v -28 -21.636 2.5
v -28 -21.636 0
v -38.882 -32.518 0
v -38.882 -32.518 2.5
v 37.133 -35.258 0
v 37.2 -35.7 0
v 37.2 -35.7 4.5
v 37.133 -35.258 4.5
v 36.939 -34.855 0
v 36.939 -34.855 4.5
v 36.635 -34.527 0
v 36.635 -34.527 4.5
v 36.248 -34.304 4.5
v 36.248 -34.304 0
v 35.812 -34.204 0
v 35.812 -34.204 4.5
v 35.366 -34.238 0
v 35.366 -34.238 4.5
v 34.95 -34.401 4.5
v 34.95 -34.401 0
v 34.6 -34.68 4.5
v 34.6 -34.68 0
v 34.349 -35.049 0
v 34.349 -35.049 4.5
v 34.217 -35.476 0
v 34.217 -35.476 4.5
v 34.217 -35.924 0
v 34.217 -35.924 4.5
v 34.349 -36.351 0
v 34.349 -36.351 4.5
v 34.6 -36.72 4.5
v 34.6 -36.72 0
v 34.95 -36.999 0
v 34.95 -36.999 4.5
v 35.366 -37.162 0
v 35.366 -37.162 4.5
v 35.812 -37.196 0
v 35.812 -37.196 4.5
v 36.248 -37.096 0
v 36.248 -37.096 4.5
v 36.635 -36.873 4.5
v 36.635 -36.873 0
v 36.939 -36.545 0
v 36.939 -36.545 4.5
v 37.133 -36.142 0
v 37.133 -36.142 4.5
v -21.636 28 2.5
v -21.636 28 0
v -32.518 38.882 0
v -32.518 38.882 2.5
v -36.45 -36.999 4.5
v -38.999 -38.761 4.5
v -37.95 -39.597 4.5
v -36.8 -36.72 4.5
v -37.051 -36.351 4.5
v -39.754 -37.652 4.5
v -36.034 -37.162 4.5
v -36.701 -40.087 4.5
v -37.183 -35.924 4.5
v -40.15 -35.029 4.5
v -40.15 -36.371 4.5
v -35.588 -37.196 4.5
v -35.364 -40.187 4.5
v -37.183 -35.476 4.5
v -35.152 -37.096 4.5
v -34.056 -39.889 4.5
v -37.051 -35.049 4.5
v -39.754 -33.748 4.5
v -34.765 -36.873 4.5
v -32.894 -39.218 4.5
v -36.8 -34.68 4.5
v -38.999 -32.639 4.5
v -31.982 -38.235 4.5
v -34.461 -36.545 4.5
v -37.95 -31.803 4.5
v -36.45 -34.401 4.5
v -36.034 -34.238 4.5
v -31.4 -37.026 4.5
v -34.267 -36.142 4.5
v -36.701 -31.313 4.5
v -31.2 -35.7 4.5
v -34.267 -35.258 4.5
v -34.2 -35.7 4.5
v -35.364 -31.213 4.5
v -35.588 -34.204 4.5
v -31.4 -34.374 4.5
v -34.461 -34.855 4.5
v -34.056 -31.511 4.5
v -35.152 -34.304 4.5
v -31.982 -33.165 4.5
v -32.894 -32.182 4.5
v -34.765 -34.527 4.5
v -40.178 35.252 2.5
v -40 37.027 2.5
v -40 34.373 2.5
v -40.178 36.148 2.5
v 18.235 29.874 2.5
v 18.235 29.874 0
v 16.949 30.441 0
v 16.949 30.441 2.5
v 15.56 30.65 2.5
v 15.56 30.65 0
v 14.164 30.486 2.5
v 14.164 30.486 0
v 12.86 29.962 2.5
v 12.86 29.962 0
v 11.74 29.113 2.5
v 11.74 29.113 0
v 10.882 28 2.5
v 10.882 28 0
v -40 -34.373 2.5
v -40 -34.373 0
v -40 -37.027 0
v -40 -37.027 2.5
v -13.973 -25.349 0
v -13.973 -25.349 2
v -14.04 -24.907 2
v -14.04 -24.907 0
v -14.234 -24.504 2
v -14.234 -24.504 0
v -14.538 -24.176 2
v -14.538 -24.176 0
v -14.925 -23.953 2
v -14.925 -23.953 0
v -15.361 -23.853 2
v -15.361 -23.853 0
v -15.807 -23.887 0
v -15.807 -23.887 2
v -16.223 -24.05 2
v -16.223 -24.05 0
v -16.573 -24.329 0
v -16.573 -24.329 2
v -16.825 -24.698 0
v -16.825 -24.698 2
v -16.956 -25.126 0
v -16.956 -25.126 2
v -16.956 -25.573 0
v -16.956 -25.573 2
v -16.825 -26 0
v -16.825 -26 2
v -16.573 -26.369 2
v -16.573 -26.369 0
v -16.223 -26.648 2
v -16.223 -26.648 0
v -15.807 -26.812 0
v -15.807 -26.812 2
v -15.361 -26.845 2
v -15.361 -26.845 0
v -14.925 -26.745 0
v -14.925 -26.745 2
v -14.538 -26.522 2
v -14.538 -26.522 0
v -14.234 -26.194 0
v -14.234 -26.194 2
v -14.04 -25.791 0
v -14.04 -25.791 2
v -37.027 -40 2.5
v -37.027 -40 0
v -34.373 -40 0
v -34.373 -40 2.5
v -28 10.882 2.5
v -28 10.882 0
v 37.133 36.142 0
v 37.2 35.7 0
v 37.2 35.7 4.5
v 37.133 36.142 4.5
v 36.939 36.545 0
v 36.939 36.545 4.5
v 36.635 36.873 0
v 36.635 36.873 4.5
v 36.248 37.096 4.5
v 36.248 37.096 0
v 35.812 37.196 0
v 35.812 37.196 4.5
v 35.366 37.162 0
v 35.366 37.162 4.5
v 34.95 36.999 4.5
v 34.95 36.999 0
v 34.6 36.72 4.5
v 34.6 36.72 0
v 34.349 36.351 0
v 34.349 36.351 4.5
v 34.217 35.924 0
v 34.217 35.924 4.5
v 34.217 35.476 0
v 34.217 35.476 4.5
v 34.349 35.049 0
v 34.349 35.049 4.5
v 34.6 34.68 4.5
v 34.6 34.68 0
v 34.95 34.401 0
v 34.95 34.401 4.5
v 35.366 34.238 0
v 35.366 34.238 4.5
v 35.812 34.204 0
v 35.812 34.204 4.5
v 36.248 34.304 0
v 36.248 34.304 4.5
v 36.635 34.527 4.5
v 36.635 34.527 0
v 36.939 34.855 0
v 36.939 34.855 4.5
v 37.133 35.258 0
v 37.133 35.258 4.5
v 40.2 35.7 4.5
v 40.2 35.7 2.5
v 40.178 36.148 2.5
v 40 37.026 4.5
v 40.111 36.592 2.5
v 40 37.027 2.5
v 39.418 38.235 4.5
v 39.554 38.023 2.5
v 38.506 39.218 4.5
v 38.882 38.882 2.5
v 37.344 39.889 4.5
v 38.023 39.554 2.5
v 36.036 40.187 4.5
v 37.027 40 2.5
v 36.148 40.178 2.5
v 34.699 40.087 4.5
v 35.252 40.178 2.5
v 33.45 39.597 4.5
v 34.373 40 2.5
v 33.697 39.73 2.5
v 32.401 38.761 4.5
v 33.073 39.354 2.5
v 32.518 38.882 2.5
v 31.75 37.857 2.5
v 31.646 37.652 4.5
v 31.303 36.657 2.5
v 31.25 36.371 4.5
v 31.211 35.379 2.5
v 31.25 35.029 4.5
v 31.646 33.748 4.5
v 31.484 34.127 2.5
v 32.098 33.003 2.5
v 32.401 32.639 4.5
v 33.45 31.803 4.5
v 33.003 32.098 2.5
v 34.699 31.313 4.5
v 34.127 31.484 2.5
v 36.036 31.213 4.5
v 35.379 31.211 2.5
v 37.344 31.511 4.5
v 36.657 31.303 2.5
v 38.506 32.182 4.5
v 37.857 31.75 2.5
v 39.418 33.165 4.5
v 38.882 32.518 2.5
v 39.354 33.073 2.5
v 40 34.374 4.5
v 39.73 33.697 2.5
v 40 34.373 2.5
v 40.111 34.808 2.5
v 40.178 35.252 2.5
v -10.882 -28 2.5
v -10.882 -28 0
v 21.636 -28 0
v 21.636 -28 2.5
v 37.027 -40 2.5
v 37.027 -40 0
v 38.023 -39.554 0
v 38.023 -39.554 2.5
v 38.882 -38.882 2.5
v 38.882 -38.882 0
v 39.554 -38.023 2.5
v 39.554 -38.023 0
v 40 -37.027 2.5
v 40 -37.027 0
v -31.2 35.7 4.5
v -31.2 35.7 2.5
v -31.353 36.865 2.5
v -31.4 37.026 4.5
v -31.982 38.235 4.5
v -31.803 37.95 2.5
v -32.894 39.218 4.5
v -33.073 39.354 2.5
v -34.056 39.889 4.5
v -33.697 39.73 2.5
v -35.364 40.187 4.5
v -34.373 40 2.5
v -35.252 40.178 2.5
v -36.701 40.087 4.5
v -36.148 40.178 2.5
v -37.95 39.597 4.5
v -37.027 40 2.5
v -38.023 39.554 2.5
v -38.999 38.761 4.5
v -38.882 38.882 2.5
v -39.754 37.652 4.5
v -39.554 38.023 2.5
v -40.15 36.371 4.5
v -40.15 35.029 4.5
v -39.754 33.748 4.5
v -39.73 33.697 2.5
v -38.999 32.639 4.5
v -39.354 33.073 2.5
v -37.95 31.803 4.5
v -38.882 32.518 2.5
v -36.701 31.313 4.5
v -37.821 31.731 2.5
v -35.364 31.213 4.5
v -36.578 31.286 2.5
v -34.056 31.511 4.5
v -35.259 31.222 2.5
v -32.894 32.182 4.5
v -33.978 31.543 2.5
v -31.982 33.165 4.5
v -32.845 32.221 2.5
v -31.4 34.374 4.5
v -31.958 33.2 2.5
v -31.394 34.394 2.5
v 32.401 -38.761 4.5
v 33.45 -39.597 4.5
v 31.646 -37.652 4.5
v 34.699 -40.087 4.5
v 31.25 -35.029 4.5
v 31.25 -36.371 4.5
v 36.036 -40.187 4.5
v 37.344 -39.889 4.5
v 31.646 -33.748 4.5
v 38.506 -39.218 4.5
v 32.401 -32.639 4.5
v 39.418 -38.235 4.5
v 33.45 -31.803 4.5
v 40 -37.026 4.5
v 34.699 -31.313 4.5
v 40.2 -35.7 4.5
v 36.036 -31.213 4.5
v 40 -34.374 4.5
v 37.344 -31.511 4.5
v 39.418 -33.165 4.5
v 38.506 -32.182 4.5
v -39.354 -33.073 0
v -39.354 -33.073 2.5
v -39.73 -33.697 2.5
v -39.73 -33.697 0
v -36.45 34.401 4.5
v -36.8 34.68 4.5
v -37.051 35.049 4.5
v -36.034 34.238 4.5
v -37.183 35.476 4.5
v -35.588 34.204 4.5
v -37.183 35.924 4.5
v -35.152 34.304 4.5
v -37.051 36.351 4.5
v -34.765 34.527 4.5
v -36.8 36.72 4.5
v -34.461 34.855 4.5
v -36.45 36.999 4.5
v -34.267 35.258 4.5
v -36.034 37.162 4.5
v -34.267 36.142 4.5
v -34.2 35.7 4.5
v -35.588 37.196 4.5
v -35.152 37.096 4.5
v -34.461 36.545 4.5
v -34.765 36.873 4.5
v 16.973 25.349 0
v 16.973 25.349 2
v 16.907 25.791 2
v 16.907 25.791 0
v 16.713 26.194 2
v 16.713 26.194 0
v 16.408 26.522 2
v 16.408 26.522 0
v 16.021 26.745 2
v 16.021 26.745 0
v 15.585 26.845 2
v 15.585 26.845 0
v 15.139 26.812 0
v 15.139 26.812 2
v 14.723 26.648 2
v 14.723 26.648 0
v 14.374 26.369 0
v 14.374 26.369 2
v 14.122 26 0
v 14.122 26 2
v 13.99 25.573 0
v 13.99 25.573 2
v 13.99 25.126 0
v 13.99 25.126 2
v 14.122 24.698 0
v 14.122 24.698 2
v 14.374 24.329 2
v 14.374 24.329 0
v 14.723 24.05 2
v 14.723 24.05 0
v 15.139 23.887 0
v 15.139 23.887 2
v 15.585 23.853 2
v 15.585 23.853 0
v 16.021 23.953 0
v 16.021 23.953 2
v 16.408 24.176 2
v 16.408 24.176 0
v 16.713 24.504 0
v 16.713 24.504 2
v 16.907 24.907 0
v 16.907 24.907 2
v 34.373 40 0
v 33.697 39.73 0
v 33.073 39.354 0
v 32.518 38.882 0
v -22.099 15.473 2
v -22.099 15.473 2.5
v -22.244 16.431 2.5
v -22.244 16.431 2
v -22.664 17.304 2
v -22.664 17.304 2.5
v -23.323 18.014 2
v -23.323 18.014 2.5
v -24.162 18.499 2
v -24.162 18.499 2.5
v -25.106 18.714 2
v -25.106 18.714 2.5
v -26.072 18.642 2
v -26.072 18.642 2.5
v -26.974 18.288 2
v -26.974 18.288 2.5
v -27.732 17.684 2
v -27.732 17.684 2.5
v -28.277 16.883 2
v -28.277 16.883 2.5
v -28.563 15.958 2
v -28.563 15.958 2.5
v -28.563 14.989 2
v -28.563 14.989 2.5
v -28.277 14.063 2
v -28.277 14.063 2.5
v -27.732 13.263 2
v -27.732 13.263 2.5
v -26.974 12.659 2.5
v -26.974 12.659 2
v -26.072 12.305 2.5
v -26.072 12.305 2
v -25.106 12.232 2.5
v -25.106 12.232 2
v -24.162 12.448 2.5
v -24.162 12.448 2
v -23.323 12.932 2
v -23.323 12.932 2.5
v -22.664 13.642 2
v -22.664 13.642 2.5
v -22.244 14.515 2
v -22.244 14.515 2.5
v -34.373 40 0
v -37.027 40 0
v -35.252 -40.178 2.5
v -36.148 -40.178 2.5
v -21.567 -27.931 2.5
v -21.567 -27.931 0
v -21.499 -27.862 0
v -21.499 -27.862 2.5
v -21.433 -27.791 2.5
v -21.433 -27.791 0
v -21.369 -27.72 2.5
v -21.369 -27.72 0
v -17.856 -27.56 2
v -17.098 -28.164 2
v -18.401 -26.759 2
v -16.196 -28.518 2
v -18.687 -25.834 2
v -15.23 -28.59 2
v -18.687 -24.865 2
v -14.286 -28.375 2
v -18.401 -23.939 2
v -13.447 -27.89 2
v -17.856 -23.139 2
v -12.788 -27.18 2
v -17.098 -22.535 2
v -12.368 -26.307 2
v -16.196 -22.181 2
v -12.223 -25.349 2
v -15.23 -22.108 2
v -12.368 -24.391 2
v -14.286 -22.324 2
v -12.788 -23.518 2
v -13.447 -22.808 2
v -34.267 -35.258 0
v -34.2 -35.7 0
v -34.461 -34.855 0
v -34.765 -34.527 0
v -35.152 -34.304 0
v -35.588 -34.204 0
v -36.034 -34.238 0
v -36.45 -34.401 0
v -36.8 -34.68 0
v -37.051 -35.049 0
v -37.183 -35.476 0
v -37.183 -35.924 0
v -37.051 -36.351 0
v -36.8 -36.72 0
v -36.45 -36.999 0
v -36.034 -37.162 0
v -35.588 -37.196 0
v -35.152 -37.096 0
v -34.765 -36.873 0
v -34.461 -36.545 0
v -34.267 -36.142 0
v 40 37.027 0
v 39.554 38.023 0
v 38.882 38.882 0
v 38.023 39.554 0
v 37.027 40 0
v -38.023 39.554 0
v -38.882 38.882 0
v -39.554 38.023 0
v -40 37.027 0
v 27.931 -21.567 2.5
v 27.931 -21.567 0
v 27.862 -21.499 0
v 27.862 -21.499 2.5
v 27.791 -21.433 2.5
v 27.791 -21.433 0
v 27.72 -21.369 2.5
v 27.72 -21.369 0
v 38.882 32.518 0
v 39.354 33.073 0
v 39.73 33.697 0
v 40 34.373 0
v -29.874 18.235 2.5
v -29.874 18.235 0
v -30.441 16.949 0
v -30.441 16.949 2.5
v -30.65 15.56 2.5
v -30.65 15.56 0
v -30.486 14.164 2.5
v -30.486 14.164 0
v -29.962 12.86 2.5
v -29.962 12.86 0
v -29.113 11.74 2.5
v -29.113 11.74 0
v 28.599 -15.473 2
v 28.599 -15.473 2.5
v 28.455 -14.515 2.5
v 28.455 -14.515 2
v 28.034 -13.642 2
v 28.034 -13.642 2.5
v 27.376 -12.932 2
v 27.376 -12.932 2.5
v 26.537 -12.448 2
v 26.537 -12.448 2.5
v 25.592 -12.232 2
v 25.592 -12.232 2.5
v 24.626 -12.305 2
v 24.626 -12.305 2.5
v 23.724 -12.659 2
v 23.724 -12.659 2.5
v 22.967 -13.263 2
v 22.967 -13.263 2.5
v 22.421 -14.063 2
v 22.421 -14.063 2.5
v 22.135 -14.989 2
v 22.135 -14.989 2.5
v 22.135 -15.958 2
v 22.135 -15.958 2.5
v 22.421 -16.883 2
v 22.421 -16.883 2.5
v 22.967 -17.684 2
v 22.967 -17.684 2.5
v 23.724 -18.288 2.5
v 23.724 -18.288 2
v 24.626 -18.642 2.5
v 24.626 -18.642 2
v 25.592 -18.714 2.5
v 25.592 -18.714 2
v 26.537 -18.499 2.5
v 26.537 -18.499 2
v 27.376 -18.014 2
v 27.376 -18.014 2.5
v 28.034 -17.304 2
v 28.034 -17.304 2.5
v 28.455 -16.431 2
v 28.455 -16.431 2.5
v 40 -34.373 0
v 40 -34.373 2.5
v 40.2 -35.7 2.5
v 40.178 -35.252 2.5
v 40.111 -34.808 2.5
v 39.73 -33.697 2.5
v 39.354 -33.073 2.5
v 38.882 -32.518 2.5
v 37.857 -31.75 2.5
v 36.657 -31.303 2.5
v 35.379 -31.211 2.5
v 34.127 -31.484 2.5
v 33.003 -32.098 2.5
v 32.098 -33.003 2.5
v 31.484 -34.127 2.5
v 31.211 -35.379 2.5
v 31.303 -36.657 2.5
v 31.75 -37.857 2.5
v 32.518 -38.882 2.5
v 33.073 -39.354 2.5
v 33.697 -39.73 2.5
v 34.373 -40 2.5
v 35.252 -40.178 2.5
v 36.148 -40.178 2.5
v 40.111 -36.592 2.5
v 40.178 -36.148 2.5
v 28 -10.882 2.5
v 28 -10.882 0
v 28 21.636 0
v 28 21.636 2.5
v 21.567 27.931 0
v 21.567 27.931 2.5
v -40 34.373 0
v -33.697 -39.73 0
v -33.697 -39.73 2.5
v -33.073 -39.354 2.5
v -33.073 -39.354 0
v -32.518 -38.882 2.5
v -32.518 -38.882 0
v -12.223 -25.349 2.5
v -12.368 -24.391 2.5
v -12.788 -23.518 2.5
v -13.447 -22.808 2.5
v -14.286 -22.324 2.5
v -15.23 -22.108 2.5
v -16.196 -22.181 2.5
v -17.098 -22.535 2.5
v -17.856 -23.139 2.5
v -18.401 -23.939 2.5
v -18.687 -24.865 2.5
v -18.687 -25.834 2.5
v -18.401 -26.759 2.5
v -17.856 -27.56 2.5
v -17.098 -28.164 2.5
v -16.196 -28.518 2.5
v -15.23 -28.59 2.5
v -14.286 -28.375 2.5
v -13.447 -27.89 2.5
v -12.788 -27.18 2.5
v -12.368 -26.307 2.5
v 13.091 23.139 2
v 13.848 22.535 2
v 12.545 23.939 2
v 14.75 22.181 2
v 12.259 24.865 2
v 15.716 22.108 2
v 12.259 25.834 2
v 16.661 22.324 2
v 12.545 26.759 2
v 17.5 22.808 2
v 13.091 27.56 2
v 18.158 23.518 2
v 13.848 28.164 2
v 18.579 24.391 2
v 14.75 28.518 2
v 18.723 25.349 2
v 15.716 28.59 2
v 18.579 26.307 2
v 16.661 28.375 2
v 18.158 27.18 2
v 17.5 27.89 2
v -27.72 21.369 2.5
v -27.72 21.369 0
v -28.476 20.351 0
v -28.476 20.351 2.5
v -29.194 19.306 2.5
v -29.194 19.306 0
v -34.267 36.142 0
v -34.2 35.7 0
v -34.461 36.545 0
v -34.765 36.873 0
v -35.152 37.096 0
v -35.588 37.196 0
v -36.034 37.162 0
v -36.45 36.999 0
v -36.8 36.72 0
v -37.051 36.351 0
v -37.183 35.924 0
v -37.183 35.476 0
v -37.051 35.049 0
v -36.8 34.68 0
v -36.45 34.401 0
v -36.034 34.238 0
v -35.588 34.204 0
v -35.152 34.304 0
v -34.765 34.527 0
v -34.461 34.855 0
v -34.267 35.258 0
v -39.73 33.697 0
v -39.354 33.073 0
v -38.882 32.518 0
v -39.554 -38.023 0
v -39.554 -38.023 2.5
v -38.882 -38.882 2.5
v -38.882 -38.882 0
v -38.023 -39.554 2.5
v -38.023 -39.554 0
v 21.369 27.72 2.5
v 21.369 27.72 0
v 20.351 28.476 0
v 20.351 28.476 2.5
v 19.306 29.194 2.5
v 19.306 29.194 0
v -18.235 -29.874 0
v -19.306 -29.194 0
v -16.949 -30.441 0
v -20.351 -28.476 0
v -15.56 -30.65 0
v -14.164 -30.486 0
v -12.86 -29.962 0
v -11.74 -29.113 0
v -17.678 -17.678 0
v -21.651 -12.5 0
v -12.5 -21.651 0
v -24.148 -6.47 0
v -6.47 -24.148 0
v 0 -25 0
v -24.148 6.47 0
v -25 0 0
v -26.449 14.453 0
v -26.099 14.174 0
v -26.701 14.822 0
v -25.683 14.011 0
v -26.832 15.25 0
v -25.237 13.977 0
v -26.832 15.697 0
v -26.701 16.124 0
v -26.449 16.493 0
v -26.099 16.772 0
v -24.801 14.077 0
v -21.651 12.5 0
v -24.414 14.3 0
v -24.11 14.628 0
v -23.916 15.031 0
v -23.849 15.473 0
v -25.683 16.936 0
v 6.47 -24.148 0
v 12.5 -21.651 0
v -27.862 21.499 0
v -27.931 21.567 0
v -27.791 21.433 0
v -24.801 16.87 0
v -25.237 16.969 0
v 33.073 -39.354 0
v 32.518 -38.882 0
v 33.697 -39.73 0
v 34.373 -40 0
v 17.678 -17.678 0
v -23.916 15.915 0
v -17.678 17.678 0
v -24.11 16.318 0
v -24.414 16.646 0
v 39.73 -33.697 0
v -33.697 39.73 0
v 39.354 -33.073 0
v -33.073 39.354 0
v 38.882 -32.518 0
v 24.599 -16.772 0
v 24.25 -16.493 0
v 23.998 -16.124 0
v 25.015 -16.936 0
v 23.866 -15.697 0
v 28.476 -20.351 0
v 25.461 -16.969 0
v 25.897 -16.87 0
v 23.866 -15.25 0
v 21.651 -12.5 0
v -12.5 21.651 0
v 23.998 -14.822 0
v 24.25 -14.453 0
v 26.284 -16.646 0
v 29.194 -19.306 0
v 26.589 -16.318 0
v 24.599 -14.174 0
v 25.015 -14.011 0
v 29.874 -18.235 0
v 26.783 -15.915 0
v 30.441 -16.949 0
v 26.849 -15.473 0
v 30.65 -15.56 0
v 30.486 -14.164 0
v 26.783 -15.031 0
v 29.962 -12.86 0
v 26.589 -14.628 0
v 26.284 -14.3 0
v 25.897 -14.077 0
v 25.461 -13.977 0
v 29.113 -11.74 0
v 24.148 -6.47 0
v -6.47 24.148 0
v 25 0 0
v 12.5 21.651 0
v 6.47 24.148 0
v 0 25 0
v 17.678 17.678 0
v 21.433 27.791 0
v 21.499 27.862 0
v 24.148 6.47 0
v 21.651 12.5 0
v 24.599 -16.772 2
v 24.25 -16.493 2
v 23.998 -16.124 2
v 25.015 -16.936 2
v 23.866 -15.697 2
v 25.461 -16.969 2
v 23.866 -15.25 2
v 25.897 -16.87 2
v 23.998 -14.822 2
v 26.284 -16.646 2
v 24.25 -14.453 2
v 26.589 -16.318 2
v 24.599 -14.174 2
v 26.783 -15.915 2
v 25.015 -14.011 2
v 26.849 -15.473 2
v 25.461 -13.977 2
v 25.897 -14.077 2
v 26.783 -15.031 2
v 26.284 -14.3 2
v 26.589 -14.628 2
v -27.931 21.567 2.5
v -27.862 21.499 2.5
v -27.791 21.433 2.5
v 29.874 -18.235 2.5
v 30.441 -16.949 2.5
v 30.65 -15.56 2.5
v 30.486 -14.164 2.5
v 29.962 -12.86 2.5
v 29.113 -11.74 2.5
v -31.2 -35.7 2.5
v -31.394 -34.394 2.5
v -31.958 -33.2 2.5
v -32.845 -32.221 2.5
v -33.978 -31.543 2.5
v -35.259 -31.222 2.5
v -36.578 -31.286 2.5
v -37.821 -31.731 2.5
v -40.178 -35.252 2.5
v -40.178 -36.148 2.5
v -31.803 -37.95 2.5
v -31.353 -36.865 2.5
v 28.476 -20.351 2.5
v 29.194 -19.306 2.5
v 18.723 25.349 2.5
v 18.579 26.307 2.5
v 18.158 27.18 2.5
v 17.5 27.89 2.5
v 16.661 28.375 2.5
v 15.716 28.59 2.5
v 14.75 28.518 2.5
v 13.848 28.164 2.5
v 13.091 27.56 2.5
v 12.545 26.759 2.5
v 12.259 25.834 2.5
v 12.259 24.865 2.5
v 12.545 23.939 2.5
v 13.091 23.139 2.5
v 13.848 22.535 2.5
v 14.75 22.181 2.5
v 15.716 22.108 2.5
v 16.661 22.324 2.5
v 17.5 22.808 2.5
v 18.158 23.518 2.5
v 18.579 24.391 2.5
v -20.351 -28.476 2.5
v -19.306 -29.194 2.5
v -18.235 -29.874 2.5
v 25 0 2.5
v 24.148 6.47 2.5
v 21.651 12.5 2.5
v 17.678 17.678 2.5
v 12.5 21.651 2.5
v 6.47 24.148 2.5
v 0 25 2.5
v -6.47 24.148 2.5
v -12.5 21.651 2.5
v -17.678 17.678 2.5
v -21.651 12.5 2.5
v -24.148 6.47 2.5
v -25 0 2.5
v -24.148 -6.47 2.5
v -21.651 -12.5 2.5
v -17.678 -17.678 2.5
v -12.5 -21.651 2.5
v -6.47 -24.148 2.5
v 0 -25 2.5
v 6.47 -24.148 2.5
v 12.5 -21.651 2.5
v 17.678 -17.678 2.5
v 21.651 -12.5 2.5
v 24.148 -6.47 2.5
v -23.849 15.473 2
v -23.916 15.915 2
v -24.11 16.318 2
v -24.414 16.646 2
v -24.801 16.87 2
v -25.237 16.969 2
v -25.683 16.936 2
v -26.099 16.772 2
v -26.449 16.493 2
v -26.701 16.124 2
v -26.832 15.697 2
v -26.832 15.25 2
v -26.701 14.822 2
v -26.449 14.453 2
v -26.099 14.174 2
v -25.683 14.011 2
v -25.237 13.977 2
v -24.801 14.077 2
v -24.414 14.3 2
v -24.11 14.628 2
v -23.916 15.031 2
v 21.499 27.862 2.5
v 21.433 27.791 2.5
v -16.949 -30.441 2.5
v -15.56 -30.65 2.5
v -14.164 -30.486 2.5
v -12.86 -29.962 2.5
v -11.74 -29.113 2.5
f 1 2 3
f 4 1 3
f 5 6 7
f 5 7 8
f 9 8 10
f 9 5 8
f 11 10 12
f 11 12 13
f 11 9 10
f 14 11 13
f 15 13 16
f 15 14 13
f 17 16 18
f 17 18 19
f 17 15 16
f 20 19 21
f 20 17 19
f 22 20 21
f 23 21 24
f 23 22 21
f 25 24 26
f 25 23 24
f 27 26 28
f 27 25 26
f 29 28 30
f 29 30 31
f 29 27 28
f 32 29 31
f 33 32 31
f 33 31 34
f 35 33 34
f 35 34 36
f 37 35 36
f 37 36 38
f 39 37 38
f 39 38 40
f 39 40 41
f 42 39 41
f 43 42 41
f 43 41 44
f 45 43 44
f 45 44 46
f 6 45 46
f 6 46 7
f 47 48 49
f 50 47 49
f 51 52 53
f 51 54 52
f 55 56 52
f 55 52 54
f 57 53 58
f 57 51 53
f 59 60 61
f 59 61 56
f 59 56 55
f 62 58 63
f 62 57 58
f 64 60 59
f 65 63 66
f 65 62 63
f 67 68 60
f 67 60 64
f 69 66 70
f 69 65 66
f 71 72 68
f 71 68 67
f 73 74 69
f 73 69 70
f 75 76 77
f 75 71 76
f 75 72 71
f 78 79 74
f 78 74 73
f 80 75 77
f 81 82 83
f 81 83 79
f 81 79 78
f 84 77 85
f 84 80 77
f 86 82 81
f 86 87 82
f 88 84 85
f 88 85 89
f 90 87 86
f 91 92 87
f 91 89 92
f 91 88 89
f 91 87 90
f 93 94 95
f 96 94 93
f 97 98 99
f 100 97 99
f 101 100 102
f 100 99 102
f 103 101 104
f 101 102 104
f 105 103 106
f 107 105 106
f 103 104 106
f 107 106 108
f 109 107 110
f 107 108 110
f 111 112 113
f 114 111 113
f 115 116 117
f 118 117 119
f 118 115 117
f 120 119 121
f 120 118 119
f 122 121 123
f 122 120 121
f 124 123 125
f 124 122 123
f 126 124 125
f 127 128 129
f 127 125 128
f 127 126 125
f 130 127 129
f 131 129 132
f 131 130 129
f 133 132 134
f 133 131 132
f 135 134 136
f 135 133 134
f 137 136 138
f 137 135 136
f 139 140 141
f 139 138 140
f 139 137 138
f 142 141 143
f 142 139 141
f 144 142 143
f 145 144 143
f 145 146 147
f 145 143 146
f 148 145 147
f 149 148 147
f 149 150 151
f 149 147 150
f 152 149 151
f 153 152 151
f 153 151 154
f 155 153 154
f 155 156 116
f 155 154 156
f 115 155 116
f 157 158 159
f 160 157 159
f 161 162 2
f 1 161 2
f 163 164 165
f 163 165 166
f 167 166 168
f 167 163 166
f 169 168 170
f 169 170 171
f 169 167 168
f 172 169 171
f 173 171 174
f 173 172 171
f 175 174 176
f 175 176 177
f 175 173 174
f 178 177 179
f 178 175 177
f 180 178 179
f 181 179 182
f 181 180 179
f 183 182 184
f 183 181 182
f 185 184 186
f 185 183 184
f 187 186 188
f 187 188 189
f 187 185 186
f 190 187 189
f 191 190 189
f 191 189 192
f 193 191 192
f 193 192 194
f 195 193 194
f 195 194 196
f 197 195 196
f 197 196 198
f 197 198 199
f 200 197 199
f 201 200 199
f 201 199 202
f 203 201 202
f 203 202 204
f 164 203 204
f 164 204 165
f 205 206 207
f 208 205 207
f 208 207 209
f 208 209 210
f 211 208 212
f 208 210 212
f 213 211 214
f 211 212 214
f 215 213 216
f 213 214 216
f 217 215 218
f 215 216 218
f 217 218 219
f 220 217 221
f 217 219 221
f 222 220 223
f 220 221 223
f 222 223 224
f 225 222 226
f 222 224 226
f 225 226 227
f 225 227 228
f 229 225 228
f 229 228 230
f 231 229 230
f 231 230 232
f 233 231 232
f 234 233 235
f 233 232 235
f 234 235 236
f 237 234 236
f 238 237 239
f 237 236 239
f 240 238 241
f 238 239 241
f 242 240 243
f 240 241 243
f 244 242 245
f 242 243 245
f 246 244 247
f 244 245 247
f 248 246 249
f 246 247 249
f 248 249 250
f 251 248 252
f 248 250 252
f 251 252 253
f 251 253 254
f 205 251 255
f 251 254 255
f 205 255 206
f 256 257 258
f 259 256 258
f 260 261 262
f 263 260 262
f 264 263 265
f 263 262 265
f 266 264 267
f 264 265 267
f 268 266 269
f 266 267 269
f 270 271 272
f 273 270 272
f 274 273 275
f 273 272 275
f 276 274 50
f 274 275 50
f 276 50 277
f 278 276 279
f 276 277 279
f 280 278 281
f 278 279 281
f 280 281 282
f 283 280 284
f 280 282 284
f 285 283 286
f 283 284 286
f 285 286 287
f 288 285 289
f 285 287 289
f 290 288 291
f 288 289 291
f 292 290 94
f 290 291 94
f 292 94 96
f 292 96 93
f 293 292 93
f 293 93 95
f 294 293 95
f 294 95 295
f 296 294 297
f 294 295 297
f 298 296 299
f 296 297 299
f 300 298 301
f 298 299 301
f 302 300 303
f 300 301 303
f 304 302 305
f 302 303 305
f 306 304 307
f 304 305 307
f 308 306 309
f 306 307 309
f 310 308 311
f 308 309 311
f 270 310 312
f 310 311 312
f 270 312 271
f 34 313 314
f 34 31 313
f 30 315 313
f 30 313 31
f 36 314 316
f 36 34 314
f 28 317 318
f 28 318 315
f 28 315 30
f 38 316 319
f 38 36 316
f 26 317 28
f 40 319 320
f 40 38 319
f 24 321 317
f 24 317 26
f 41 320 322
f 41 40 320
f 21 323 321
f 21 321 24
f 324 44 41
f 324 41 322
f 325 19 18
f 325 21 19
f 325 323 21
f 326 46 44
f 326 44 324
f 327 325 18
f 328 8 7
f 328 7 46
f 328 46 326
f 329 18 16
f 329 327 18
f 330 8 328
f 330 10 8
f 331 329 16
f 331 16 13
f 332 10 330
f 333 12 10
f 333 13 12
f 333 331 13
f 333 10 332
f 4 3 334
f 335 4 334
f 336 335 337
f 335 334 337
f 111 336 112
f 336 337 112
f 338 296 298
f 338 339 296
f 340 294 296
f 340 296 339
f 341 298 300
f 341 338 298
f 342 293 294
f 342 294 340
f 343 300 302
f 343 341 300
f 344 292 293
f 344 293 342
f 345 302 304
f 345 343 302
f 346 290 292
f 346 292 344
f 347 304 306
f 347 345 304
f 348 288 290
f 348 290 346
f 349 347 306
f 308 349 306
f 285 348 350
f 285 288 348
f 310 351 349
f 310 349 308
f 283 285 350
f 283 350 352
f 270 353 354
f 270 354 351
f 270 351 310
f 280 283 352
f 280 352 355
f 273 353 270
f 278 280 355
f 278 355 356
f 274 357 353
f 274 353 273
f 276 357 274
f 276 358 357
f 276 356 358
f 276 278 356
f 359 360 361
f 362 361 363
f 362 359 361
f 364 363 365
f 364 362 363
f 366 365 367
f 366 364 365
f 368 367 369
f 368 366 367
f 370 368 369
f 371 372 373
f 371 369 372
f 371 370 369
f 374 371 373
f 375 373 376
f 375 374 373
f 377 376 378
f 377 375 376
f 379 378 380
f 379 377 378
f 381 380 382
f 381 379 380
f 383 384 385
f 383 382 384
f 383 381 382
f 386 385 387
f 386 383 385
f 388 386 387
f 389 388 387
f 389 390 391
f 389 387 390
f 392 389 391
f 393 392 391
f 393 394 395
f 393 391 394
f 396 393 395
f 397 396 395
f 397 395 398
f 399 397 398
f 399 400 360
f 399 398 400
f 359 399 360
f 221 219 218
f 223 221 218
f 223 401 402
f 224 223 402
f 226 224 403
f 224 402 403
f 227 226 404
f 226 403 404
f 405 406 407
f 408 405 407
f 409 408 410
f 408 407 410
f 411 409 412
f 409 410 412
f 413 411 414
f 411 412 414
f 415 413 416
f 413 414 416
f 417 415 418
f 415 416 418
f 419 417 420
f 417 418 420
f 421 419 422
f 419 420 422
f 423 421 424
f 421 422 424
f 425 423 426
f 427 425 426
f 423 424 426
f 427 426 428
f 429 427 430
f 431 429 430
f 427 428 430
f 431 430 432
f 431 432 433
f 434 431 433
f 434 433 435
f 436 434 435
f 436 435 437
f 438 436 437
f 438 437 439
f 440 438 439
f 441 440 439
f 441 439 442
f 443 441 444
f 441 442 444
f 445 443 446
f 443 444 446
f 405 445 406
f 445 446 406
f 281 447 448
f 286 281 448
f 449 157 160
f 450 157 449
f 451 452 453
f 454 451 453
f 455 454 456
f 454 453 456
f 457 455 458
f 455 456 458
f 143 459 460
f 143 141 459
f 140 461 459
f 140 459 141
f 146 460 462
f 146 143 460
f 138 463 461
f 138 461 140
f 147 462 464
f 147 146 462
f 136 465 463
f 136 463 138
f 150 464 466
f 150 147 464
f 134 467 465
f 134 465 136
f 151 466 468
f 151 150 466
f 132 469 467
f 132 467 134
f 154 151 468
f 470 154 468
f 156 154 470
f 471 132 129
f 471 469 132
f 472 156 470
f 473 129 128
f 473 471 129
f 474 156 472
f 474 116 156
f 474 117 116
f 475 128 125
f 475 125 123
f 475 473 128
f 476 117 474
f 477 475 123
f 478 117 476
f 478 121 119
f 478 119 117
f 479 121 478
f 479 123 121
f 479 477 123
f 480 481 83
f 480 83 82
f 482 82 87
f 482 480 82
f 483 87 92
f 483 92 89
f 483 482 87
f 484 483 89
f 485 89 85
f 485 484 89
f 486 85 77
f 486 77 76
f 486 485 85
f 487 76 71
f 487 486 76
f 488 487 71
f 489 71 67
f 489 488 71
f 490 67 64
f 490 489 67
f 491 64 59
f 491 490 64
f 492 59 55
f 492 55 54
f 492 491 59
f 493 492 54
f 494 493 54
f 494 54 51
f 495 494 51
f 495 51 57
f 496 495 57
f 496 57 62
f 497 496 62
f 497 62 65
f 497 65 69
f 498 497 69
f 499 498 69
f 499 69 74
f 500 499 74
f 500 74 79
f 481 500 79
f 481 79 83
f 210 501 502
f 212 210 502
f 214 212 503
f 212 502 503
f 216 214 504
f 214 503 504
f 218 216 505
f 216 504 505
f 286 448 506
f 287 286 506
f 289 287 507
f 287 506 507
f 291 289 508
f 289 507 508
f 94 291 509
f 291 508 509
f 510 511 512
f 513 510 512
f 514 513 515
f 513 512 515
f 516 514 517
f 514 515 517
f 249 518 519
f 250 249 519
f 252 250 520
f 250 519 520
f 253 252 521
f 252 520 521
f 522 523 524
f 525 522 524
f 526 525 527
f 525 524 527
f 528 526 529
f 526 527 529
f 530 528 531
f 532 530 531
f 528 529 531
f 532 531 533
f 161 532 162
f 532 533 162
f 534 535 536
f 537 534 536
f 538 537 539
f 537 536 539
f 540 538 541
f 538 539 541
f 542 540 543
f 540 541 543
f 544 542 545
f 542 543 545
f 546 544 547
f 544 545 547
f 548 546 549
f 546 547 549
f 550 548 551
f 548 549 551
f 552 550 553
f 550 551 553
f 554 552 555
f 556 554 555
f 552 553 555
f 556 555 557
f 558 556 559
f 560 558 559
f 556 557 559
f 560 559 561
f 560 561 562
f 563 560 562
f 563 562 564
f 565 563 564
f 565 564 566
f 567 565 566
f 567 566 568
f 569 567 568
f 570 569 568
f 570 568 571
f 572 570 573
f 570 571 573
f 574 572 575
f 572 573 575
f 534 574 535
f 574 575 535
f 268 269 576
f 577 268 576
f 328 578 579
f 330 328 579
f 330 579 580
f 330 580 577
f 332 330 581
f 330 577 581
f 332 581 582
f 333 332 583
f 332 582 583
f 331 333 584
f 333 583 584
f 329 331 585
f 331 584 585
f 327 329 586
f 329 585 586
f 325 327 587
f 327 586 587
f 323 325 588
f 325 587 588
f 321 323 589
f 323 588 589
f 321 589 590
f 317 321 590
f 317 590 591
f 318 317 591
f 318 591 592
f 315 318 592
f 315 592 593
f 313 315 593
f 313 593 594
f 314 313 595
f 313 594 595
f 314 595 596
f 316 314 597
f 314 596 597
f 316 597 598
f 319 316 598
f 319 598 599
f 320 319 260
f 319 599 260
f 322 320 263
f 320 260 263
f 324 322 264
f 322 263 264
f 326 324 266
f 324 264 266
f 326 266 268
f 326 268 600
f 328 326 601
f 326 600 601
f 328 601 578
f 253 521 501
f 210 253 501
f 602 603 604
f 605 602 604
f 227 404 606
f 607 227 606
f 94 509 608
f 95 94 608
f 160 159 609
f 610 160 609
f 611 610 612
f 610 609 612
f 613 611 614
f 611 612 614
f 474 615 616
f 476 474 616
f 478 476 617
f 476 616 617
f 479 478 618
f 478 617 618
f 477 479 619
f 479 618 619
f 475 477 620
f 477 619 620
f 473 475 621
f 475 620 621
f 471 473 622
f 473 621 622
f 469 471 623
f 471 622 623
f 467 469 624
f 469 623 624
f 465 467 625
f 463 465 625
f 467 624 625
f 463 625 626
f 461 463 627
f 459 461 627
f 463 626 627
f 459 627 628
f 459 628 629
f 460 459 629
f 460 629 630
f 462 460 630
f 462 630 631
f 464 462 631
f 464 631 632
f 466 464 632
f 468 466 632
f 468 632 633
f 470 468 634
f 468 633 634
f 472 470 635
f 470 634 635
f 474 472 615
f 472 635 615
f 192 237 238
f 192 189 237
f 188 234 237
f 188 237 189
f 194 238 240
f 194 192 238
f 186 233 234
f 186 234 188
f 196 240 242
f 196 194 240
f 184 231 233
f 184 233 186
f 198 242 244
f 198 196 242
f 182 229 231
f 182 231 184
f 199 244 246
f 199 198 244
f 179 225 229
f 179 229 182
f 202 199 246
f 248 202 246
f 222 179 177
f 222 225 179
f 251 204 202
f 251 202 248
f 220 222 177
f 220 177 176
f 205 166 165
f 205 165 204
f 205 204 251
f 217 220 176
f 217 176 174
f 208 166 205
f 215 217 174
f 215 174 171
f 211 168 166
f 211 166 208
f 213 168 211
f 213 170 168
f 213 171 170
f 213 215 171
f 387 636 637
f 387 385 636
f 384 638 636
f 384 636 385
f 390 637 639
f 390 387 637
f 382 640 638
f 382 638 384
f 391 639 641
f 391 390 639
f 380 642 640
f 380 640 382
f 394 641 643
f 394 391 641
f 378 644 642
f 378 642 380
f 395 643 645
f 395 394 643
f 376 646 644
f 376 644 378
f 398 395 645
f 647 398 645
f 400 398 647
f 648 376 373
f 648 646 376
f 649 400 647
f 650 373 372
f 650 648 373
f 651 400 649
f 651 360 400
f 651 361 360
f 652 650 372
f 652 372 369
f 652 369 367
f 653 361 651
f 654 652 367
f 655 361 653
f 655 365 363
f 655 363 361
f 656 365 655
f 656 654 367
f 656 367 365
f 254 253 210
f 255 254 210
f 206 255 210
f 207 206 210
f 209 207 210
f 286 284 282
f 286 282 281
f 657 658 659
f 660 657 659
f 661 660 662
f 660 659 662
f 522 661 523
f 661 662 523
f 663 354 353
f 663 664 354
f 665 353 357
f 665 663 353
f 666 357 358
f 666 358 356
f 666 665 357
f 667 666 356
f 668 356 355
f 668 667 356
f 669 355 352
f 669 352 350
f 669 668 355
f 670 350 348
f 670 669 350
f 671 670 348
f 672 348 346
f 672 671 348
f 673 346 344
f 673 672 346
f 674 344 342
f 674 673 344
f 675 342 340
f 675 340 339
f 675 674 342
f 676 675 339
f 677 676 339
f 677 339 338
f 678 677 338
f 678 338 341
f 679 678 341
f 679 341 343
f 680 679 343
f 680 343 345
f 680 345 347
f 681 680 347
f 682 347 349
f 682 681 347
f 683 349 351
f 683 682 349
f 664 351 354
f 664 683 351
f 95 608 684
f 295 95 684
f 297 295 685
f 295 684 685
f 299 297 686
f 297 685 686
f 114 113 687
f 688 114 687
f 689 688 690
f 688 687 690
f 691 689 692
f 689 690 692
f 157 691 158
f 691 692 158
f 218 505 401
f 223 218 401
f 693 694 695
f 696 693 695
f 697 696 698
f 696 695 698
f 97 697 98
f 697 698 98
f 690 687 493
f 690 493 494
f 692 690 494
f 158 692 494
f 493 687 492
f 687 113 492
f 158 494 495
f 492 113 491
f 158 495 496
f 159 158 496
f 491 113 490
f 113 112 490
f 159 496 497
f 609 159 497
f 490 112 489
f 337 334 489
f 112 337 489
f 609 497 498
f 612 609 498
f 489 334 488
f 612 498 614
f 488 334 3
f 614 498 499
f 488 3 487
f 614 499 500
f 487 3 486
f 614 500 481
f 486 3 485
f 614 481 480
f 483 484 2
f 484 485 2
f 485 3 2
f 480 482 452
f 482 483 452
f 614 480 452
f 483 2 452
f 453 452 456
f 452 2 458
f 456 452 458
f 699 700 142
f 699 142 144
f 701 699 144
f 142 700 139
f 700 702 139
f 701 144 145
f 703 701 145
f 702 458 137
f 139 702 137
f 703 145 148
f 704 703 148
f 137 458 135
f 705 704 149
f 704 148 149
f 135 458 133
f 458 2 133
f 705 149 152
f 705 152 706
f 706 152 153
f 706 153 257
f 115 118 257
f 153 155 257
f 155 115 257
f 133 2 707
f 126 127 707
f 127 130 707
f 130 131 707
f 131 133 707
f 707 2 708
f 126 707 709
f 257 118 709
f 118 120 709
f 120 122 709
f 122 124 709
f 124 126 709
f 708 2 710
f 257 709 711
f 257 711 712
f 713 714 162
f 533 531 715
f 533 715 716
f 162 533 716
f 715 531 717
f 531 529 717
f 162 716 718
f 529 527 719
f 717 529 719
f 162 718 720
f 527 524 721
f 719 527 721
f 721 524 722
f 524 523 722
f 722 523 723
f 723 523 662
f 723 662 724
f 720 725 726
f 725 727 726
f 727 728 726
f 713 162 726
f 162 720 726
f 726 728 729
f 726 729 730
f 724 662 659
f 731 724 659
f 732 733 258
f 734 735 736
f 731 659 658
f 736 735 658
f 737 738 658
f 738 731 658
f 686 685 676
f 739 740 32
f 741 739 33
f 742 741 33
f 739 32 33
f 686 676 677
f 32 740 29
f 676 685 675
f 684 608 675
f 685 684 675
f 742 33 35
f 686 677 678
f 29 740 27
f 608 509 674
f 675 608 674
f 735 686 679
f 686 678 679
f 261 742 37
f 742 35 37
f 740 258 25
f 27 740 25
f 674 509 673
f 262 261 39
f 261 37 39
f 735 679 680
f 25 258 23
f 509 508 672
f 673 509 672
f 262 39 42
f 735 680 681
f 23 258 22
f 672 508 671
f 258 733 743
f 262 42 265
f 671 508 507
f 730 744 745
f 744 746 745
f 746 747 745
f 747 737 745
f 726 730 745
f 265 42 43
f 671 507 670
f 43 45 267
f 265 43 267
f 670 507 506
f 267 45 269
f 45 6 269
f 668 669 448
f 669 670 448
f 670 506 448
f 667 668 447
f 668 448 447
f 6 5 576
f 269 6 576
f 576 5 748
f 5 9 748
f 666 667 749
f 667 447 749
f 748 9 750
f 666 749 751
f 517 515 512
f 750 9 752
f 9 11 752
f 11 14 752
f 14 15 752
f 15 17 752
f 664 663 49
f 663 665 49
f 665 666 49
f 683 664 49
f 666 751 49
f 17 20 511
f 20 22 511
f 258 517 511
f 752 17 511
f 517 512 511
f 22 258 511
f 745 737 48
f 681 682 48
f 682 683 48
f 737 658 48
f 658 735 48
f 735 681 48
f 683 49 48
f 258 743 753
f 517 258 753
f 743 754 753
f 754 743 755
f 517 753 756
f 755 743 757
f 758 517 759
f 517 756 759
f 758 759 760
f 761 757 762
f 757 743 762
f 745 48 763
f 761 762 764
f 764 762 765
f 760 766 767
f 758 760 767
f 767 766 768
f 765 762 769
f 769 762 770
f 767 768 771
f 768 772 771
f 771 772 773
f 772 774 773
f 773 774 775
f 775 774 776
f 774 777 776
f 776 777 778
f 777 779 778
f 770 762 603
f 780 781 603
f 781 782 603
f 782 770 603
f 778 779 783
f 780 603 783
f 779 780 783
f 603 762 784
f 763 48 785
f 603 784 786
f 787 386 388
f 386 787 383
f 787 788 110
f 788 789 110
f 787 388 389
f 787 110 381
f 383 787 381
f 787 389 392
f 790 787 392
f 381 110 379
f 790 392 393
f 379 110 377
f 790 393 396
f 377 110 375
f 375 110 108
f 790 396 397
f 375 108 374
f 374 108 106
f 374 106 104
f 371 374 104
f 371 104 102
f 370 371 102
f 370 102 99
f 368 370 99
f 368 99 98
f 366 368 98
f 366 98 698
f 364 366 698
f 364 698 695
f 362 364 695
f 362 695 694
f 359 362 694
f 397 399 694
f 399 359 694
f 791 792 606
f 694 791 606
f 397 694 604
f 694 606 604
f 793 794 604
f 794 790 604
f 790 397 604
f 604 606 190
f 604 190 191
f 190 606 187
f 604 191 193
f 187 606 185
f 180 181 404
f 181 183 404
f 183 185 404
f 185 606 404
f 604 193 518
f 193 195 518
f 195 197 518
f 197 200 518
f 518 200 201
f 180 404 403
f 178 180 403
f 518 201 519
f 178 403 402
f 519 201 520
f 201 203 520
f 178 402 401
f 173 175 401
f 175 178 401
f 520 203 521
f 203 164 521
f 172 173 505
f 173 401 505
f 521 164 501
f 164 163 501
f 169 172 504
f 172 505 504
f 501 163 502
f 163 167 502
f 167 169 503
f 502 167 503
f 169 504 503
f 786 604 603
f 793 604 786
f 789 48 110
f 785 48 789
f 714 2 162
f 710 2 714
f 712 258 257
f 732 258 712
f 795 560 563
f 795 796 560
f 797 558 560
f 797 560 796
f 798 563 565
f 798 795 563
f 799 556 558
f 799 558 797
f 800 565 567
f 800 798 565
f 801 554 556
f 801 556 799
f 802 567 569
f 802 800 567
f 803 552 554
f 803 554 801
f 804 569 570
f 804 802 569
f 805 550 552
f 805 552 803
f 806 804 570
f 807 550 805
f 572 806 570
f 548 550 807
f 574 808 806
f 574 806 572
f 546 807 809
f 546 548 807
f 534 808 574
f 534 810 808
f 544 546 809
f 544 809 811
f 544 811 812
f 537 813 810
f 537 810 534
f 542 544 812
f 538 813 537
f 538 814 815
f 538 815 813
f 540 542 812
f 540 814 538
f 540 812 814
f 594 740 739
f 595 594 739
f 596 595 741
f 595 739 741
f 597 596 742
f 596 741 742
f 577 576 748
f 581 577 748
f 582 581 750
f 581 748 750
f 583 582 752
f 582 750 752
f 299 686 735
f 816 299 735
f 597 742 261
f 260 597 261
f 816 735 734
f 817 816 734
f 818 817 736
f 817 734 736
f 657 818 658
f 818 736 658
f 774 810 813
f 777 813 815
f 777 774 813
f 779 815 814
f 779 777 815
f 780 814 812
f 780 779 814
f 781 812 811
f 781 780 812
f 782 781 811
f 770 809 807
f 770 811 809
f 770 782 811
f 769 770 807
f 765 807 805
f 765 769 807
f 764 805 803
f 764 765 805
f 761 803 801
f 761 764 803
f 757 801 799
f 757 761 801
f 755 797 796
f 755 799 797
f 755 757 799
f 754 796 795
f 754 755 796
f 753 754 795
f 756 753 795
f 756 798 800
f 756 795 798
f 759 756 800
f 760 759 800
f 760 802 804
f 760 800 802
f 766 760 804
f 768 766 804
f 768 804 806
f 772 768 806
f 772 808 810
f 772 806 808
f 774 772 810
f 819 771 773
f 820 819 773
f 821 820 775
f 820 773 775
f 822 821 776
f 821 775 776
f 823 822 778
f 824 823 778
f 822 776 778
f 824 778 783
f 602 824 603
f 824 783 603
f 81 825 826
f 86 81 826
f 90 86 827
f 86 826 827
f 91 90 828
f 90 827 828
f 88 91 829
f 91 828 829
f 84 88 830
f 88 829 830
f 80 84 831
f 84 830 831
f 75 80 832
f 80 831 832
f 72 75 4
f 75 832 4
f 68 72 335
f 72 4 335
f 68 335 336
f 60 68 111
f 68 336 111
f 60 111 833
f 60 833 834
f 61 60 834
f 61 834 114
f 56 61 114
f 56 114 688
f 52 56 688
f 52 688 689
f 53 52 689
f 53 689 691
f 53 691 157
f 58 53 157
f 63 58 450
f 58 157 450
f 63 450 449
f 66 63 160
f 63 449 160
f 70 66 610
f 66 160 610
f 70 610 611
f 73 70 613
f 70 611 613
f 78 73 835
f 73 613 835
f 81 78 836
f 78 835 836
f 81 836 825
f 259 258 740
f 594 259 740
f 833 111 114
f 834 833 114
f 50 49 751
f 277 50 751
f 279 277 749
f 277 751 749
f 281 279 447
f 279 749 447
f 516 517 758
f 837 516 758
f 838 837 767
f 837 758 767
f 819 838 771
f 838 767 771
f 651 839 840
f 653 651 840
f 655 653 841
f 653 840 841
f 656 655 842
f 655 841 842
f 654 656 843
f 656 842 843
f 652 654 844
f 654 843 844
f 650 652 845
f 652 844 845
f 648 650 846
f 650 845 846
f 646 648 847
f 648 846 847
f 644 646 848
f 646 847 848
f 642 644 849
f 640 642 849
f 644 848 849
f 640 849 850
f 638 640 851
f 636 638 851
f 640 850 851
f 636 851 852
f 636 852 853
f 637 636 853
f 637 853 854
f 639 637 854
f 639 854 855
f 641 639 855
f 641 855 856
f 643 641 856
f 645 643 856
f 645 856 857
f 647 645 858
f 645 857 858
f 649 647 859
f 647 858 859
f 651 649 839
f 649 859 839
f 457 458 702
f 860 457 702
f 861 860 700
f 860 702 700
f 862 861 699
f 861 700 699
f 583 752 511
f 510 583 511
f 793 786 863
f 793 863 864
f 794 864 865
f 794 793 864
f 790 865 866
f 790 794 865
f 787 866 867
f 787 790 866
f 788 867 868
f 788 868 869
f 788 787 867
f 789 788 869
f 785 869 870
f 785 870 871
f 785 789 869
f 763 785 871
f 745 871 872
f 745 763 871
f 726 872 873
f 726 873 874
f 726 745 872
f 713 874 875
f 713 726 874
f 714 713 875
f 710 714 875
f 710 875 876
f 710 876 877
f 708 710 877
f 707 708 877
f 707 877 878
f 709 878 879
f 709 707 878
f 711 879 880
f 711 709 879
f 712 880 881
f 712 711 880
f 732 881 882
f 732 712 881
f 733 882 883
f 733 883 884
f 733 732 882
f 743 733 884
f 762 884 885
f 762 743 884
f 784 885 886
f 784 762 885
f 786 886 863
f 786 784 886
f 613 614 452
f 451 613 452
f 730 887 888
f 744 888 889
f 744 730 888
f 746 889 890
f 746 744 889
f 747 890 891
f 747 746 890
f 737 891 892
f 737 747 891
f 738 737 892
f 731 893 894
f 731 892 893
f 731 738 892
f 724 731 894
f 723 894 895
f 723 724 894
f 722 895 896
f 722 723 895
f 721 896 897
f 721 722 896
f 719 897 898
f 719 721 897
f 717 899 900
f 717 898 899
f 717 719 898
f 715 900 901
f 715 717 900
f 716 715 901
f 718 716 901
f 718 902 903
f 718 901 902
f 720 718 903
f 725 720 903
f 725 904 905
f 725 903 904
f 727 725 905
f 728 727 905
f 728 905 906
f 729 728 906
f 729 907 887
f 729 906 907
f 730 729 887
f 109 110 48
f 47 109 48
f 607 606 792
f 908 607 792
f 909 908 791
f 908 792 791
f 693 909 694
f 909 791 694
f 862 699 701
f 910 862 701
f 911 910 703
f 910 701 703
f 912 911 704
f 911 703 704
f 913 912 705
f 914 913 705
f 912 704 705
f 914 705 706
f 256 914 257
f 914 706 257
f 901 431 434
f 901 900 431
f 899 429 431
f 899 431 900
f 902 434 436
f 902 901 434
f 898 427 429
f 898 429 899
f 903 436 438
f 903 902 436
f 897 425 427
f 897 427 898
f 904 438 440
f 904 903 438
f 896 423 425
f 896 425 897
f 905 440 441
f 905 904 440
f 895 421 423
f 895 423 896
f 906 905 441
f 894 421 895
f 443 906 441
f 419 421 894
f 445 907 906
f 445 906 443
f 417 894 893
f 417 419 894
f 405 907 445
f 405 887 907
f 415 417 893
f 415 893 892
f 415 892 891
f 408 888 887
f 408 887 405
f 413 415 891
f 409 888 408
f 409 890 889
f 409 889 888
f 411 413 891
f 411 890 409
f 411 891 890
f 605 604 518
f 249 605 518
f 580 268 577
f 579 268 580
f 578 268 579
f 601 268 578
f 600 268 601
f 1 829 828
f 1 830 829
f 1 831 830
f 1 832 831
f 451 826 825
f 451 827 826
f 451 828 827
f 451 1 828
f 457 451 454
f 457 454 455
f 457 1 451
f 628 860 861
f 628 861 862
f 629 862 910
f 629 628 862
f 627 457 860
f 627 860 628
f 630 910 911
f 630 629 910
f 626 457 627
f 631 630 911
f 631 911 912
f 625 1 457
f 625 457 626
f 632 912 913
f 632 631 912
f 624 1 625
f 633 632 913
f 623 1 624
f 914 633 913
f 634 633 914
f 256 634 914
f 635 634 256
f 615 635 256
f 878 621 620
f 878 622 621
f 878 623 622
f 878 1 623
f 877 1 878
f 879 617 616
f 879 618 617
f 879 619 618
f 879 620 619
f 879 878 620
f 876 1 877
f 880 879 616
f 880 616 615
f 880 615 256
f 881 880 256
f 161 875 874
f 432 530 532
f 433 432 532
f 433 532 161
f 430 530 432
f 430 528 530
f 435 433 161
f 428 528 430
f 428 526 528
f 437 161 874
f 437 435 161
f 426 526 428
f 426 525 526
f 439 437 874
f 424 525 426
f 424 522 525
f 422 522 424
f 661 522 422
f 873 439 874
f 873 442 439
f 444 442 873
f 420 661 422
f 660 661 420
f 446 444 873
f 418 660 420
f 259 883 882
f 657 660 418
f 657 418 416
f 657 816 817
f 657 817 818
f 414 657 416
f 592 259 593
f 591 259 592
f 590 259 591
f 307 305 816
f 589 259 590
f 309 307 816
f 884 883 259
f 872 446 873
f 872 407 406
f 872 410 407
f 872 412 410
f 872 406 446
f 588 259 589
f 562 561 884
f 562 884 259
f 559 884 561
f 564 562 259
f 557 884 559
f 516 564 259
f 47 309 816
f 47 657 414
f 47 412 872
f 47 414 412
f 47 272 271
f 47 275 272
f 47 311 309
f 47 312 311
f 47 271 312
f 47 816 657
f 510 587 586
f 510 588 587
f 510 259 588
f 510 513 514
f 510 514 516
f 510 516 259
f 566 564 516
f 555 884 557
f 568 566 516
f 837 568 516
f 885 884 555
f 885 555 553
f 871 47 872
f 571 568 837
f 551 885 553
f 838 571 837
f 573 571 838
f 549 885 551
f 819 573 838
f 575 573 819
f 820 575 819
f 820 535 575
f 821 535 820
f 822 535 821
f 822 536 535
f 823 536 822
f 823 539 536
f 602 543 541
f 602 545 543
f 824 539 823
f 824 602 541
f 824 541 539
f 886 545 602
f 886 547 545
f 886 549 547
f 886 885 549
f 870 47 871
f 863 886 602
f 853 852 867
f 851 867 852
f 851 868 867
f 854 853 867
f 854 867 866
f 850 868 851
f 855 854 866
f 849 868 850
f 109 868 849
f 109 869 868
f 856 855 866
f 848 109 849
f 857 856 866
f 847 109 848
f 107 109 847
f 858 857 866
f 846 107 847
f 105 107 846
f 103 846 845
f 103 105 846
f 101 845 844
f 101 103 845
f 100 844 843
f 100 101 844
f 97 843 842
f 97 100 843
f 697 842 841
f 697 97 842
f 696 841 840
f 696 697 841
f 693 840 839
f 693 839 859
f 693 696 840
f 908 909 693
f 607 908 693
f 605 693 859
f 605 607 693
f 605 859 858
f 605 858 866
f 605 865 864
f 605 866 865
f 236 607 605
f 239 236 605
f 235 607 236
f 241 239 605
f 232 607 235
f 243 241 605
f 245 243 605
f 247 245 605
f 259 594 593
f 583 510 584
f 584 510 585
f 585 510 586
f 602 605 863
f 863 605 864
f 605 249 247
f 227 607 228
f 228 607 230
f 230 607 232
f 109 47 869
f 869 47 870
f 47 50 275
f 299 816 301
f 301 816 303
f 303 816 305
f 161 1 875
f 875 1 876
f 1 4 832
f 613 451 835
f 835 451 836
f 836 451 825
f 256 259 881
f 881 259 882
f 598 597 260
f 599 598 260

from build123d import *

# Parameters (mm, degrees)
SKETCH1_R           = 1.5
SKETCH1_R_2         = 25
BOSS_EXTRUDE1_DEPTH = 2.5
SKETCH2_R           = 3.25
CUT_EXTRUDE1_DEPTH  = 0.5
SKETCH4_R           = 4.5
SKETCH4_R_2         = 1.5
BOSS_EXTRUDE2_DEPTH = 2


with BuildPart() as part:
    # Sketch1 → Boss-Extrude1 (new body)
    with BuildSketch(Plane.XY):
        with BuildLine():
            Line((34.373350084, -40), (37.026649916, -40))
            ThreePointArc((37.026649916, -40), (38.881980515, -38.881980515), (40, -37.026649916))
            Line((40, -37.026649916), (40, -34.373350084))
            ThreePointArc((40, -34.373350084), (39.554292544, -33.377408993), (38.881980515, -32.518019485))
            Line((38.881980515, -32.518019485), (27.930717857, -21.566756826))
            ThreePointArc((27.930717857, -21.566756826), (27.826741101, -21.466071831), (27.719580149, -21.368782754))
            ThreePointArc((27.719580149, -21.368782754), (28.839517017, -19.831345346), (29.874277905, -18.235337114))
            ThreePointArc((29.874277905, -18.235337114), (30.48642799, -14.163770708), (28, -10.881994271))
            Line((28, -10.881994271), (28, 21.636038969))
            Line((28, 21.636038969), (38.881980515, 32.518019485))
            ThreePointArc((38.881980515, 32.518019485), (39.554292544, 33.377408993), (40, 34.373350084))
            Line((40, 34.373350084), (40, 37.026649916))
            ThreePointArc((40, 37.026649916), (38.881980515, 38.881980515), (37.026649916, 40))
            Line((37.026649916, 40), (34.373350084, 40))
            ThreePointArc((34.373350084, 40), (33.377408993, 39.554292544), (32.518019485, 38.881980515))
            Line((32.518019485, 38.881980515), (21.566756826, 27.930717857))
            ThreePointArc((21.566756826, 27.930717857), (21.466071831, 27.826741101), (21.368782754, 27.719580149))
            ThreePointArc((21.368782754, 27.719580149), (19.831345346, 28.839517017), (18.235337114, 29.874277905))
            ThreePointArc((18.235337114, 29.874277905), (14.163770708, 30.48642799), (10.881994271, 28))
            Line((10.881994271, 28), (-21.636038969, 28))
            Line((-21.636038969, 28), (-32.518019485, 38.881980515))
            ThreePointArc((-32.518019485, 38.881980515), (-33.377408993, 39.554292544), (-34.373350084, 40))
            Line((-34.373350084, 40), (-37.026649916, 40))
            ThreePointArc((-37.026649916, 40), (-38.881980515, 38.881980515), (-40, 37.026649916))
            Line((-40, 37.026649916), (-40, 34.373350084))
            ThreePointArc((-40, 34.373350084), (-39.554292544, 33.377408993), (-38.881980515, 32.518019485))
            Line((-38.881980515, 32.518019485), (-27.930717857, 21.566756826))
            ThreePointArc((-27.930717857, 21.566756826), (-27.826741101, 21.466071831), (-27.719580149, 21.368782754))
            ThreePointArc((-27.719580149, 21.368782754), (-28.839517017, 19.831345346), (-29.874277905, 18.235337114))
            ThreePointArc((-29.874277905, 18.235337114), (-30.48642799, 14.163770708), (-28, 10.881994271))
            Line((-28, 10.881994271), (-28, -21.636038969))
            Line((-28, -21.636038969), (-38.881980515, -32.518019485))
            ThreePointArc((-38.881980515, -32.518019485), (-39.554292544, -33.377408993), (-40, -34.373350084))
            Line((-40, -34.373350084), (-40, -37.026649916))
            ThreePointArc((-40, -37.026649916), (-38.881980515, -38.881980515), (-37.026649916, -40))
            Line((-37.026649916, -40), (-34.373350084, -40))
            ThreePointArc((-34.373350084, -40), (-33.377408993, -39.554292544), (-32.518019485, -38.881980515))
            Line((-32.518019485, -38.881980515), (-21.566756826, -27.930717857))
            ThreePointArc((-21.566756826, -27.930717857), (-21.466071831, -27.826741101), (-21.368782754, -27.719580149))
            ThreePointArc((-21.368782754, -27.719580149), (-19.831345346, -28.839517017), (-18.235337114, -29.874277905))
            ThreePointArc((-18.235337114, -29.874277905), (-14.163770708, -30.48642799), (-10.881994271, -28))
            Line((-10.881994271, -28), (21.636038969, -28))
            Line((21.636038969, -28), (32.518019485, -38.881980515))
            ThreePointArc((32.518019485, -38.881980515), (33.377408993, -39.554292544), (34.373350084, -40))
        make_face()
        with Locations((-35.7, -35.7)):
            Circle(SKETCH1_R, mode=Mode.SUBTRACT)
        with Locations((-15.473196637, -25.349165387)):
            Circle(SKETCH1_R, mode=Mode.SUBTRACT)
        with Locations((35.7, -35.7)):
            Circle(SKETCH1_R, mode=Mode.SUBTRACT)
        Circle(SKETCH1_R_2, mode=Mode.SUBTRACT)
        with Locations((25.349165387, -15.473196637)):
            Circle(SKETCH1_R, mode=Mode.SUBTRACT)
        with Locations((-25.349165387, 15.473196637)):
            Circle(SKETCH1_R, mode=Mode.SUBTRACT)
        with Locations((-35.7, 35.7)):
            Circle(SKETCH1_R, mode=Mode.SUBTRACT)
        with Locations((15.473196637, 25.349165387)):
            Circle(SKETCH1_R, mode=Mode.SUBTRACT)
        with Locations((35.7, 35.7)):
            Circle(SKETCH1_R, mode=Mode.SUBTRACT)
    extrude(amount=BOSS_EXTRUDE1_DEPTH)

    # Sketch2 → Cut-Extrude1 (cut)
    with BuildSketch(Plane.XY.offset(2.5)):
        with Locations((-15.473196637, -25.349165387)):
            Circle(SKETCH2_R)
        with Locations((25.349165387, -15.473196637)):
            Circle(SKETCH2_R)
        with Locations((15.473196637, 25.349165387)):
            Circle(SKETCH2_R)
        with Locations((-25.349165387, 15.473196637)):
            Circle(SKETCH2_R)
    extrude(amount=-CUT_EXTRUDE1_DEPTH, mode=Mode.SUBTRACT)

    # Sketch4 → Boss-Extrude2 (add)
    with BuildSketch(Plane.XY.offset(2.5)):
        with Locations((-35.7, 35.7)):
            Circle(SKETCH4_R)
        with Locations((-35.7, 35.7)):
            Circle(SKETCH4_R_2, mode=Mode.SUBTRACT)
        with Locations((35.7, 35.7)):
            Circle(SKETCH4_R)
        with Locations((35.7, 35.7)):
            Circle(SKETCH4_R_2, mode=Mode.SUBTRACT)
        with Locations((35.7, -35.7)):
            Circle(SKETCH4_R)
        with Locations((35.7, -35.7)):
            Circle(SKETCH4_R_2, mode=Mode.SUBTRACT)
        with Locations((-35.7, -35.7)):
            Circle(SKETCH4_R)
        with Locations((-35.7, -35.7)):
            Circle(SKETCH4_R_2, mode=Mode.SUBTRACT)
    extrude(amount=BOSS_EXTRUDE2_DEPTH)


solid = part.part
